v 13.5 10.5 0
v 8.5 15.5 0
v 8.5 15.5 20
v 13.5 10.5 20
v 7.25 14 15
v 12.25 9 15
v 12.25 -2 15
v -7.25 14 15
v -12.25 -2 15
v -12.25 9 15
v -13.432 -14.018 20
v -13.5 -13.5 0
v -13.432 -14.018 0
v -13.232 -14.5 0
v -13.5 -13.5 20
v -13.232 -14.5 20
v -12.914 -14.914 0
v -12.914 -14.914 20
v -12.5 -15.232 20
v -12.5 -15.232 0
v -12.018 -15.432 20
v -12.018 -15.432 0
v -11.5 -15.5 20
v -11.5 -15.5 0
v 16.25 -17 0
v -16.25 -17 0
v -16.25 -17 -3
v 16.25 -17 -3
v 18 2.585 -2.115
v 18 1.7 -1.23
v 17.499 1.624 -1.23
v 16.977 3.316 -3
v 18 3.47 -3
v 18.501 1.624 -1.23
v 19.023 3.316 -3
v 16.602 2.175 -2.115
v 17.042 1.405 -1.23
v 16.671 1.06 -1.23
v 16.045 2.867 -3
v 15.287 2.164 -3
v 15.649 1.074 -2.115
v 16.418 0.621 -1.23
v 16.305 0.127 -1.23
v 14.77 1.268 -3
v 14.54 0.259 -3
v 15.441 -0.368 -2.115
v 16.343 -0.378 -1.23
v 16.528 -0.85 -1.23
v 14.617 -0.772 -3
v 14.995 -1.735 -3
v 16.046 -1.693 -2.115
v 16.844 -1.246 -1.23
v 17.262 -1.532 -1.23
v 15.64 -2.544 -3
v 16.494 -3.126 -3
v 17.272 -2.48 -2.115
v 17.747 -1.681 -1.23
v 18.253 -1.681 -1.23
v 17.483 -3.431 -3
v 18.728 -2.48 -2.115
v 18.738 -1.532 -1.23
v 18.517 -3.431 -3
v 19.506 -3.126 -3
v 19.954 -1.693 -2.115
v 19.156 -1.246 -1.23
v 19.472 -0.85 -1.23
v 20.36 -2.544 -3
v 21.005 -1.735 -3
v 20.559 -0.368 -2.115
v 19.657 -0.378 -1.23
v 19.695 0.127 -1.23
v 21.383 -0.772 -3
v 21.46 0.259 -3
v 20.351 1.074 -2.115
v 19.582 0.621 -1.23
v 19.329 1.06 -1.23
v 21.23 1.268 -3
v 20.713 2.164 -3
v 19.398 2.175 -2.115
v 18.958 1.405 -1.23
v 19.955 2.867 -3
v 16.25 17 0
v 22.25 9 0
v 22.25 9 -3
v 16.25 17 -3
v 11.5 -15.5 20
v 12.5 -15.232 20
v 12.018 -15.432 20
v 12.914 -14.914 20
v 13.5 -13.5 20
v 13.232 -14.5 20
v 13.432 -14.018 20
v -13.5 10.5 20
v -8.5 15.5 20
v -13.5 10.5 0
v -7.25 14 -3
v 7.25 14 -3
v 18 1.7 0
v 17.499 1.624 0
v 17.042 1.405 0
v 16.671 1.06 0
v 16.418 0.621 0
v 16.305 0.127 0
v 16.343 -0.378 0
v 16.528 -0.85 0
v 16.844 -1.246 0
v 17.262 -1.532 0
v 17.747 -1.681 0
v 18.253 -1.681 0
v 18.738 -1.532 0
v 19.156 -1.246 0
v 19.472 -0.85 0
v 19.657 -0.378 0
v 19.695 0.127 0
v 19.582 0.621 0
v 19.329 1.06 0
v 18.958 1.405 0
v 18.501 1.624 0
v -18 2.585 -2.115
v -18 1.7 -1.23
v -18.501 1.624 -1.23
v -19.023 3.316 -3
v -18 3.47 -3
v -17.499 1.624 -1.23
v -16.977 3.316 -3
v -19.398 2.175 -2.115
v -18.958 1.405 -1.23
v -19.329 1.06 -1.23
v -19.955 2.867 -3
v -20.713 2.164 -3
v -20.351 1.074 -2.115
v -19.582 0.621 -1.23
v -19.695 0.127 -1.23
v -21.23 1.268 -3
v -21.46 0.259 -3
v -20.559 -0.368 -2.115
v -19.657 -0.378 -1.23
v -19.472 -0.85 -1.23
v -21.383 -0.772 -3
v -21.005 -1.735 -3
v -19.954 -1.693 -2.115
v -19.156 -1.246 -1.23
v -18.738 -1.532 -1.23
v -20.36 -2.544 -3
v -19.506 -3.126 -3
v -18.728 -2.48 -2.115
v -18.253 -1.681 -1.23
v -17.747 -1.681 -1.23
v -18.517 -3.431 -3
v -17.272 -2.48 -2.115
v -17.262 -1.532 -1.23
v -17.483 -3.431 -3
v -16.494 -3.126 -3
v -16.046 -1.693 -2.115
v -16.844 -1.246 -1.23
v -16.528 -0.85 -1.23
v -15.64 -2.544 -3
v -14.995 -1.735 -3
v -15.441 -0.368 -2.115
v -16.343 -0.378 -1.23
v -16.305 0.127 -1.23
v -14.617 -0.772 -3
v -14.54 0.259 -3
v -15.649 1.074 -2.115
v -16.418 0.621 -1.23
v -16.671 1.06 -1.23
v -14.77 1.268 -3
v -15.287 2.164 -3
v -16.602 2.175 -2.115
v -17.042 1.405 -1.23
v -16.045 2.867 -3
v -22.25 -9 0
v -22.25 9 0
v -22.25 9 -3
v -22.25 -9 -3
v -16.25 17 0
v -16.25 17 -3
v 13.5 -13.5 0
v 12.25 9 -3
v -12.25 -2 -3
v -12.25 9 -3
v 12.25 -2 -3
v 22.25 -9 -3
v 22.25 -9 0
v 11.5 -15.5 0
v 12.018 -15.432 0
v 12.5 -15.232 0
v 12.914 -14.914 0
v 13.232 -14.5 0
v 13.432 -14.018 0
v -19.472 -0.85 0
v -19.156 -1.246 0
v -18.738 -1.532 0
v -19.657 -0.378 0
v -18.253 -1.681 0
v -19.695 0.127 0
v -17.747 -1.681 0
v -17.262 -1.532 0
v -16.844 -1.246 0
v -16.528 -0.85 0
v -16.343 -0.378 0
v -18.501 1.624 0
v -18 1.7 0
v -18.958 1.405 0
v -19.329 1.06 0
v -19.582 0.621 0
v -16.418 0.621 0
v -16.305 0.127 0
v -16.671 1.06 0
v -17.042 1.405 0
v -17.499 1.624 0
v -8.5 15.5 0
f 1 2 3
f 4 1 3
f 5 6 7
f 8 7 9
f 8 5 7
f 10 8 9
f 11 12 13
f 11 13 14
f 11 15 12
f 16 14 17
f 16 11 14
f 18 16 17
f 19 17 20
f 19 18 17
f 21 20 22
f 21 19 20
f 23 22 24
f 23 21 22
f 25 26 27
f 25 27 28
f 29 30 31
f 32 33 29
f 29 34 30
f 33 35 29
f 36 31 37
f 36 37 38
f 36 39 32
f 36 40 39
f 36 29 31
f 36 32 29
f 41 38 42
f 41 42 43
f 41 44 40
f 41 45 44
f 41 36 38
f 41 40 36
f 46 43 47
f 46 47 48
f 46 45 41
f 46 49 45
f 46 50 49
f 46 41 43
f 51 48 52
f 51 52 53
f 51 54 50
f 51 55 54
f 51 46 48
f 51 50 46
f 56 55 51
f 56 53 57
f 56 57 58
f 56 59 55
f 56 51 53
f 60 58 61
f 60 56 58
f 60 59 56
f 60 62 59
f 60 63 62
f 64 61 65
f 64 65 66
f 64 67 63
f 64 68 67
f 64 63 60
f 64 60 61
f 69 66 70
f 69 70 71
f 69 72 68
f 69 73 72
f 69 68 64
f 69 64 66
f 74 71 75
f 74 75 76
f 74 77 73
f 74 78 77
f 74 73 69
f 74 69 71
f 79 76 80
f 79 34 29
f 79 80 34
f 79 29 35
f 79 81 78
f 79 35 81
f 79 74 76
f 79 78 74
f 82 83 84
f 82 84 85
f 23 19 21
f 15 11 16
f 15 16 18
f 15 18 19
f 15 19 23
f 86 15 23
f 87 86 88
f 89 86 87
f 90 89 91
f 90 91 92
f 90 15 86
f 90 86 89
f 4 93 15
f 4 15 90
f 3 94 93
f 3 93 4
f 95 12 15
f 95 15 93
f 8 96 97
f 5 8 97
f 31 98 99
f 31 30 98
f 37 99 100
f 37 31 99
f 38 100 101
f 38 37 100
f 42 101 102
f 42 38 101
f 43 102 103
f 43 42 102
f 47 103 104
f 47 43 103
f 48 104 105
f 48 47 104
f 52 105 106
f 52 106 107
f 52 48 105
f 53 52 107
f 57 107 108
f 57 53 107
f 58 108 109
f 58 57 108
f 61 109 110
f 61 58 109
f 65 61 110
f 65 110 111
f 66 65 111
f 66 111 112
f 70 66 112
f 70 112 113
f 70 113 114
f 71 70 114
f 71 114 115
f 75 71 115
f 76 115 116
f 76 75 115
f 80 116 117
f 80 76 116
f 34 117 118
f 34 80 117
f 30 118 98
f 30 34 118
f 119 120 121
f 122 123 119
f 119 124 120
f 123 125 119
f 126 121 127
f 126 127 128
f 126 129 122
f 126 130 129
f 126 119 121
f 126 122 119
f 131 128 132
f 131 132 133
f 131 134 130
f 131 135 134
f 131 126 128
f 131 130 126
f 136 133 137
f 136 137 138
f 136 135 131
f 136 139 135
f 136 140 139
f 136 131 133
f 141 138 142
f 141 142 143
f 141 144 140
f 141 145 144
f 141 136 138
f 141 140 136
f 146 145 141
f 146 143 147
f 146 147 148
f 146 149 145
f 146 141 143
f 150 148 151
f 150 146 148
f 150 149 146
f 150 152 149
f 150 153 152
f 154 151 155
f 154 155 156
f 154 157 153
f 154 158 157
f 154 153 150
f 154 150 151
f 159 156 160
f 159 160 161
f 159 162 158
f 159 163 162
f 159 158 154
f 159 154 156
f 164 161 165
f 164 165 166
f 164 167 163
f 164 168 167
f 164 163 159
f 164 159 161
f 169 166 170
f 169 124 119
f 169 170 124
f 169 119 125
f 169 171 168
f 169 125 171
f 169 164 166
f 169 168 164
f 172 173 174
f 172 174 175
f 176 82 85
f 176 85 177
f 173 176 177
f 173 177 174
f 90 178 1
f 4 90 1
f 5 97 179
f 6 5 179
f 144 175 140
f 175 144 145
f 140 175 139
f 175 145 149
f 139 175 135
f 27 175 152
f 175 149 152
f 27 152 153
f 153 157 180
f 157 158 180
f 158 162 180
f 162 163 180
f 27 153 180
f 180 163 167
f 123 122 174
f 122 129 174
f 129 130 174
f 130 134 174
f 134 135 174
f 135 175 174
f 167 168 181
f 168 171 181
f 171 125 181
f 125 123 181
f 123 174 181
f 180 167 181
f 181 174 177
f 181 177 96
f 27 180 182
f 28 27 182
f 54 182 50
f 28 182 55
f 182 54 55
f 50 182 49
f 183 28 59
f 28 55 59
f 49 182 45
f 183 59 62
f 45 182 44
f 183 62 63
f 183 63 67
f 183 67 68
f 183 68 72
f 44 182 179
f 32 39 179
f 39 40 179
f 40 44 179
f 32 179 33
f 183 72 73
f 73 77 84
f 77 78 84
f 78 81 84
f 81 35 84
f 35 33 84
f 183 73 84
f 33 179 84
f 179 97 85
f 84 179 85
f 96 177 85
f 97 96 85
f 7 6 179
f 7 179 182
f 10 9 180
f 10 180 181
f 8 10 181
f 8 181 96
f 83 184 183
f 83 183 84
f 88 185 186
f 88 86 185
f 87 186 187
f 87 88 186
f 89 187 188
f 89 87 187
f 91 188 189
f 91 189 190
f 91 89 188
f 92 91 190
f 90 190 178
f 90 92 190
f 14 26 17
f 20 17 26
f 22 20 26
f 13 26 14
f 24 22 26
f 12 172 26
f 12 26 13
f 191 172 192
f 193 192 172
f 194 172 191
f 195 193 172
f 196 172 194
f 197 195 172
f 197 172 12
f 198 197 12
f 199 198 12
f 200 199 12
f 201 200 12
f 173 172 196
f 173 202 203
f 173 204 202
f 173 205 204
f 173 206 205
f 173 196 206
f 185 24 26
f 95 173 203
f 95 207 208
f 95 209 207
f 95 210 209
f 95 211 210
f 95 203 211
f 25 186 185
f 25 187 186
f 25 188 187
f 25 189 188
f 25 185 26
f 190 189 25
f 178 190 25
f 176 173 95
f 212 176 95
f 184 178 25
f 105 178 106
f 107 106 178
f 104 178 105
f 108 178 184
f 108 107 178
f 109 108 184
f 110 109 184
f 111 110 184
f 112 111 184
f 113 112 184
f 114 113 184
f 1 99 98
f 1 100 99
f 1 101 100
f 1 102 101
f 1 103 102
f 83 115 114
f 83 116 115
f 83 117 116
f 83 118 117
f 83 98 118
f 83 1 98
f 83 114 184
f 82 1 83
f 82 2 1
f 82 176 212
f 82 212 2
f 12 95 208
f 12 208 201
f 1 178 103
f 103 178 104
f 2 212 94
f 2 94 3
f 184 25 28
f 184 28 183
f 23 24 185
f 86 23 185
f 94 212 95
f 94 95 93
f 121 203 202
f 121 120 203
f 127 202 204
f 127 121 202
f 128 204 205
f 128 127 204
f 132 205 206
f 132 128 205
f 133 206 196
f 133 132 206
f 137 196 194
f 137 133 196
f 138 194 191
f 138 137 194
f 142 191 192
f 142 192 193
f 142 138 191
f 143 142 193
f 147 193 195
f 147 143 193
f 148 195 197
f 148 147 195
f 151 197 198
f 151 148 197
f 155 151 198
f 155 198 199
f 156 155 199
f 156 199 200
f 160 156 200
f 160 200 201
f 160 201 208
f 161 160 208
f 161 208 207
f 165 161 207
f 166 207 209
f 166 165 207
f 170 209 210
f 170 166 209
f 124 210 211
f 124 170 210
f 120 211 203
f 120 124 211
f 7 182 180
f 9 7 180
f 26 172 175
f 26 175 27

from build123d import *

# Parameters (mm, degrees)
SKIZZE1_W                                   = 27
SKIZZE1_H                                   = 31
AUFSATZ_LINEAR_AUSTRAGEN1_DEPTH             = 20
AUFSATZ_LINEAR_AUSTRAGEN2_DEPTH             = 3
FORMSENKUNG_F_R_M3_SENKSCHRAUBE_MIT_2_COUNT = 2
FORMSENKUNG_F_R_M3_SENKSCHRAUBE_MIT_2_PITCH = 36
SCHNITT_LINEAR_AUSTRAGEN1_DEPTH             = 18
FASE1_SIZE                                  = 5
VERRUNDUNG1_R                               = 2


with BuildPart() as part:
    # Skizze1 → Aufsatz-Linear austragen1 (new body)
    with BuildSketch(Plane.XY):
        Rectangle(SKIZZE1_W, SKIZZE1_H)
    extrude(amount=AUFSATZ_LINEAR_AUSTRAGEN1_DEPTH)

    # Skizze2 → Aufsatz-Linear austragen2 (add)
    with BuildSketch(Plane.XY):
        Polygon((16.25, 17), (-16.25, 17), (-22.25, 9), (-22.25, -9), (-16.25, -17), (16.25, -17), (22.25, -9), (22.25, 9), align=None)
    extrude(amount=-AUFSATZ_LINEAR_AUSTRAGEN2_DEPTH)

    # Skizze3 → Formsenkung für M3 Senkschraube mit Innensechskant1 (revolve, cut)
    with BuildSketch(Plane(origin=(18, 0, -3), x_dir=(0, 1, 0), z_dir=(1, 0, 0))):
        Polygon((0, 0), (0, 3), (1.7, 3), (1.7, 1.77), (3.47, 0), align=None)
    formsenkung_f_r_m3_senkschraube_mit_inne = revolve(axis=Axis((18, 0, -9.35), (0, 0, 1)), mode=Mode.SUBTRACT)

    # Formsenkung f_r M3 Senkschraube mit  2: Formsenkung für M3 Senkschraube mit Innensechskant1 ×2
    with Locations(*[(-i * FORMSENKUNG_F_R_M3_SENKSCHRAUBE_MIT_2_PITCH, 0, 0) for i in range(1, FORMSENKUNG_F_R_M3_SENKSCHRAUBE_MIT_2_COUNT)]):
        add(formsenkung_f_r_m3_senkschraube_mit_inne, mode=Mode.SUBTRACT)

    # Skizze5 → Schnitt-Linear austragen1 (cut)
    with BuildSketch(Plane(origin=(0, 0, -3), x_dir=(-1, 0, 0), z_dir=(0, 0, -1))):
        Polygon((7.25, 14), (-7.25, 14), (-12.25, 9), (-12.25, -2), (12.25, -2), (12.25, 9), align=None)
    extrude(amount=-SCHNITT_LINEAR_AUSTRAGEN1_DEPTH, mode=Mode.SUBTRACT)

    # Fase1
    fase1_edges = [part.edges().sort_by_distance(p)[0] for p in [
        (-13.5, 15.5, 10),
        (13.5, 15.5, 10),
    ]]
    chamfer(fase1_edges, length=FASE1_SIZE)

    # Verrundung1
    verrundung1_edges = [part.edges().sort_by_distance(p)[0] for p in [
        (13.5, -15.5, 10),
        (-13.5, -15.5, 10),
    ]]
    fillet(verrundung1_edges, radius=VERRUNDUNG1_R)


solid = part.part
